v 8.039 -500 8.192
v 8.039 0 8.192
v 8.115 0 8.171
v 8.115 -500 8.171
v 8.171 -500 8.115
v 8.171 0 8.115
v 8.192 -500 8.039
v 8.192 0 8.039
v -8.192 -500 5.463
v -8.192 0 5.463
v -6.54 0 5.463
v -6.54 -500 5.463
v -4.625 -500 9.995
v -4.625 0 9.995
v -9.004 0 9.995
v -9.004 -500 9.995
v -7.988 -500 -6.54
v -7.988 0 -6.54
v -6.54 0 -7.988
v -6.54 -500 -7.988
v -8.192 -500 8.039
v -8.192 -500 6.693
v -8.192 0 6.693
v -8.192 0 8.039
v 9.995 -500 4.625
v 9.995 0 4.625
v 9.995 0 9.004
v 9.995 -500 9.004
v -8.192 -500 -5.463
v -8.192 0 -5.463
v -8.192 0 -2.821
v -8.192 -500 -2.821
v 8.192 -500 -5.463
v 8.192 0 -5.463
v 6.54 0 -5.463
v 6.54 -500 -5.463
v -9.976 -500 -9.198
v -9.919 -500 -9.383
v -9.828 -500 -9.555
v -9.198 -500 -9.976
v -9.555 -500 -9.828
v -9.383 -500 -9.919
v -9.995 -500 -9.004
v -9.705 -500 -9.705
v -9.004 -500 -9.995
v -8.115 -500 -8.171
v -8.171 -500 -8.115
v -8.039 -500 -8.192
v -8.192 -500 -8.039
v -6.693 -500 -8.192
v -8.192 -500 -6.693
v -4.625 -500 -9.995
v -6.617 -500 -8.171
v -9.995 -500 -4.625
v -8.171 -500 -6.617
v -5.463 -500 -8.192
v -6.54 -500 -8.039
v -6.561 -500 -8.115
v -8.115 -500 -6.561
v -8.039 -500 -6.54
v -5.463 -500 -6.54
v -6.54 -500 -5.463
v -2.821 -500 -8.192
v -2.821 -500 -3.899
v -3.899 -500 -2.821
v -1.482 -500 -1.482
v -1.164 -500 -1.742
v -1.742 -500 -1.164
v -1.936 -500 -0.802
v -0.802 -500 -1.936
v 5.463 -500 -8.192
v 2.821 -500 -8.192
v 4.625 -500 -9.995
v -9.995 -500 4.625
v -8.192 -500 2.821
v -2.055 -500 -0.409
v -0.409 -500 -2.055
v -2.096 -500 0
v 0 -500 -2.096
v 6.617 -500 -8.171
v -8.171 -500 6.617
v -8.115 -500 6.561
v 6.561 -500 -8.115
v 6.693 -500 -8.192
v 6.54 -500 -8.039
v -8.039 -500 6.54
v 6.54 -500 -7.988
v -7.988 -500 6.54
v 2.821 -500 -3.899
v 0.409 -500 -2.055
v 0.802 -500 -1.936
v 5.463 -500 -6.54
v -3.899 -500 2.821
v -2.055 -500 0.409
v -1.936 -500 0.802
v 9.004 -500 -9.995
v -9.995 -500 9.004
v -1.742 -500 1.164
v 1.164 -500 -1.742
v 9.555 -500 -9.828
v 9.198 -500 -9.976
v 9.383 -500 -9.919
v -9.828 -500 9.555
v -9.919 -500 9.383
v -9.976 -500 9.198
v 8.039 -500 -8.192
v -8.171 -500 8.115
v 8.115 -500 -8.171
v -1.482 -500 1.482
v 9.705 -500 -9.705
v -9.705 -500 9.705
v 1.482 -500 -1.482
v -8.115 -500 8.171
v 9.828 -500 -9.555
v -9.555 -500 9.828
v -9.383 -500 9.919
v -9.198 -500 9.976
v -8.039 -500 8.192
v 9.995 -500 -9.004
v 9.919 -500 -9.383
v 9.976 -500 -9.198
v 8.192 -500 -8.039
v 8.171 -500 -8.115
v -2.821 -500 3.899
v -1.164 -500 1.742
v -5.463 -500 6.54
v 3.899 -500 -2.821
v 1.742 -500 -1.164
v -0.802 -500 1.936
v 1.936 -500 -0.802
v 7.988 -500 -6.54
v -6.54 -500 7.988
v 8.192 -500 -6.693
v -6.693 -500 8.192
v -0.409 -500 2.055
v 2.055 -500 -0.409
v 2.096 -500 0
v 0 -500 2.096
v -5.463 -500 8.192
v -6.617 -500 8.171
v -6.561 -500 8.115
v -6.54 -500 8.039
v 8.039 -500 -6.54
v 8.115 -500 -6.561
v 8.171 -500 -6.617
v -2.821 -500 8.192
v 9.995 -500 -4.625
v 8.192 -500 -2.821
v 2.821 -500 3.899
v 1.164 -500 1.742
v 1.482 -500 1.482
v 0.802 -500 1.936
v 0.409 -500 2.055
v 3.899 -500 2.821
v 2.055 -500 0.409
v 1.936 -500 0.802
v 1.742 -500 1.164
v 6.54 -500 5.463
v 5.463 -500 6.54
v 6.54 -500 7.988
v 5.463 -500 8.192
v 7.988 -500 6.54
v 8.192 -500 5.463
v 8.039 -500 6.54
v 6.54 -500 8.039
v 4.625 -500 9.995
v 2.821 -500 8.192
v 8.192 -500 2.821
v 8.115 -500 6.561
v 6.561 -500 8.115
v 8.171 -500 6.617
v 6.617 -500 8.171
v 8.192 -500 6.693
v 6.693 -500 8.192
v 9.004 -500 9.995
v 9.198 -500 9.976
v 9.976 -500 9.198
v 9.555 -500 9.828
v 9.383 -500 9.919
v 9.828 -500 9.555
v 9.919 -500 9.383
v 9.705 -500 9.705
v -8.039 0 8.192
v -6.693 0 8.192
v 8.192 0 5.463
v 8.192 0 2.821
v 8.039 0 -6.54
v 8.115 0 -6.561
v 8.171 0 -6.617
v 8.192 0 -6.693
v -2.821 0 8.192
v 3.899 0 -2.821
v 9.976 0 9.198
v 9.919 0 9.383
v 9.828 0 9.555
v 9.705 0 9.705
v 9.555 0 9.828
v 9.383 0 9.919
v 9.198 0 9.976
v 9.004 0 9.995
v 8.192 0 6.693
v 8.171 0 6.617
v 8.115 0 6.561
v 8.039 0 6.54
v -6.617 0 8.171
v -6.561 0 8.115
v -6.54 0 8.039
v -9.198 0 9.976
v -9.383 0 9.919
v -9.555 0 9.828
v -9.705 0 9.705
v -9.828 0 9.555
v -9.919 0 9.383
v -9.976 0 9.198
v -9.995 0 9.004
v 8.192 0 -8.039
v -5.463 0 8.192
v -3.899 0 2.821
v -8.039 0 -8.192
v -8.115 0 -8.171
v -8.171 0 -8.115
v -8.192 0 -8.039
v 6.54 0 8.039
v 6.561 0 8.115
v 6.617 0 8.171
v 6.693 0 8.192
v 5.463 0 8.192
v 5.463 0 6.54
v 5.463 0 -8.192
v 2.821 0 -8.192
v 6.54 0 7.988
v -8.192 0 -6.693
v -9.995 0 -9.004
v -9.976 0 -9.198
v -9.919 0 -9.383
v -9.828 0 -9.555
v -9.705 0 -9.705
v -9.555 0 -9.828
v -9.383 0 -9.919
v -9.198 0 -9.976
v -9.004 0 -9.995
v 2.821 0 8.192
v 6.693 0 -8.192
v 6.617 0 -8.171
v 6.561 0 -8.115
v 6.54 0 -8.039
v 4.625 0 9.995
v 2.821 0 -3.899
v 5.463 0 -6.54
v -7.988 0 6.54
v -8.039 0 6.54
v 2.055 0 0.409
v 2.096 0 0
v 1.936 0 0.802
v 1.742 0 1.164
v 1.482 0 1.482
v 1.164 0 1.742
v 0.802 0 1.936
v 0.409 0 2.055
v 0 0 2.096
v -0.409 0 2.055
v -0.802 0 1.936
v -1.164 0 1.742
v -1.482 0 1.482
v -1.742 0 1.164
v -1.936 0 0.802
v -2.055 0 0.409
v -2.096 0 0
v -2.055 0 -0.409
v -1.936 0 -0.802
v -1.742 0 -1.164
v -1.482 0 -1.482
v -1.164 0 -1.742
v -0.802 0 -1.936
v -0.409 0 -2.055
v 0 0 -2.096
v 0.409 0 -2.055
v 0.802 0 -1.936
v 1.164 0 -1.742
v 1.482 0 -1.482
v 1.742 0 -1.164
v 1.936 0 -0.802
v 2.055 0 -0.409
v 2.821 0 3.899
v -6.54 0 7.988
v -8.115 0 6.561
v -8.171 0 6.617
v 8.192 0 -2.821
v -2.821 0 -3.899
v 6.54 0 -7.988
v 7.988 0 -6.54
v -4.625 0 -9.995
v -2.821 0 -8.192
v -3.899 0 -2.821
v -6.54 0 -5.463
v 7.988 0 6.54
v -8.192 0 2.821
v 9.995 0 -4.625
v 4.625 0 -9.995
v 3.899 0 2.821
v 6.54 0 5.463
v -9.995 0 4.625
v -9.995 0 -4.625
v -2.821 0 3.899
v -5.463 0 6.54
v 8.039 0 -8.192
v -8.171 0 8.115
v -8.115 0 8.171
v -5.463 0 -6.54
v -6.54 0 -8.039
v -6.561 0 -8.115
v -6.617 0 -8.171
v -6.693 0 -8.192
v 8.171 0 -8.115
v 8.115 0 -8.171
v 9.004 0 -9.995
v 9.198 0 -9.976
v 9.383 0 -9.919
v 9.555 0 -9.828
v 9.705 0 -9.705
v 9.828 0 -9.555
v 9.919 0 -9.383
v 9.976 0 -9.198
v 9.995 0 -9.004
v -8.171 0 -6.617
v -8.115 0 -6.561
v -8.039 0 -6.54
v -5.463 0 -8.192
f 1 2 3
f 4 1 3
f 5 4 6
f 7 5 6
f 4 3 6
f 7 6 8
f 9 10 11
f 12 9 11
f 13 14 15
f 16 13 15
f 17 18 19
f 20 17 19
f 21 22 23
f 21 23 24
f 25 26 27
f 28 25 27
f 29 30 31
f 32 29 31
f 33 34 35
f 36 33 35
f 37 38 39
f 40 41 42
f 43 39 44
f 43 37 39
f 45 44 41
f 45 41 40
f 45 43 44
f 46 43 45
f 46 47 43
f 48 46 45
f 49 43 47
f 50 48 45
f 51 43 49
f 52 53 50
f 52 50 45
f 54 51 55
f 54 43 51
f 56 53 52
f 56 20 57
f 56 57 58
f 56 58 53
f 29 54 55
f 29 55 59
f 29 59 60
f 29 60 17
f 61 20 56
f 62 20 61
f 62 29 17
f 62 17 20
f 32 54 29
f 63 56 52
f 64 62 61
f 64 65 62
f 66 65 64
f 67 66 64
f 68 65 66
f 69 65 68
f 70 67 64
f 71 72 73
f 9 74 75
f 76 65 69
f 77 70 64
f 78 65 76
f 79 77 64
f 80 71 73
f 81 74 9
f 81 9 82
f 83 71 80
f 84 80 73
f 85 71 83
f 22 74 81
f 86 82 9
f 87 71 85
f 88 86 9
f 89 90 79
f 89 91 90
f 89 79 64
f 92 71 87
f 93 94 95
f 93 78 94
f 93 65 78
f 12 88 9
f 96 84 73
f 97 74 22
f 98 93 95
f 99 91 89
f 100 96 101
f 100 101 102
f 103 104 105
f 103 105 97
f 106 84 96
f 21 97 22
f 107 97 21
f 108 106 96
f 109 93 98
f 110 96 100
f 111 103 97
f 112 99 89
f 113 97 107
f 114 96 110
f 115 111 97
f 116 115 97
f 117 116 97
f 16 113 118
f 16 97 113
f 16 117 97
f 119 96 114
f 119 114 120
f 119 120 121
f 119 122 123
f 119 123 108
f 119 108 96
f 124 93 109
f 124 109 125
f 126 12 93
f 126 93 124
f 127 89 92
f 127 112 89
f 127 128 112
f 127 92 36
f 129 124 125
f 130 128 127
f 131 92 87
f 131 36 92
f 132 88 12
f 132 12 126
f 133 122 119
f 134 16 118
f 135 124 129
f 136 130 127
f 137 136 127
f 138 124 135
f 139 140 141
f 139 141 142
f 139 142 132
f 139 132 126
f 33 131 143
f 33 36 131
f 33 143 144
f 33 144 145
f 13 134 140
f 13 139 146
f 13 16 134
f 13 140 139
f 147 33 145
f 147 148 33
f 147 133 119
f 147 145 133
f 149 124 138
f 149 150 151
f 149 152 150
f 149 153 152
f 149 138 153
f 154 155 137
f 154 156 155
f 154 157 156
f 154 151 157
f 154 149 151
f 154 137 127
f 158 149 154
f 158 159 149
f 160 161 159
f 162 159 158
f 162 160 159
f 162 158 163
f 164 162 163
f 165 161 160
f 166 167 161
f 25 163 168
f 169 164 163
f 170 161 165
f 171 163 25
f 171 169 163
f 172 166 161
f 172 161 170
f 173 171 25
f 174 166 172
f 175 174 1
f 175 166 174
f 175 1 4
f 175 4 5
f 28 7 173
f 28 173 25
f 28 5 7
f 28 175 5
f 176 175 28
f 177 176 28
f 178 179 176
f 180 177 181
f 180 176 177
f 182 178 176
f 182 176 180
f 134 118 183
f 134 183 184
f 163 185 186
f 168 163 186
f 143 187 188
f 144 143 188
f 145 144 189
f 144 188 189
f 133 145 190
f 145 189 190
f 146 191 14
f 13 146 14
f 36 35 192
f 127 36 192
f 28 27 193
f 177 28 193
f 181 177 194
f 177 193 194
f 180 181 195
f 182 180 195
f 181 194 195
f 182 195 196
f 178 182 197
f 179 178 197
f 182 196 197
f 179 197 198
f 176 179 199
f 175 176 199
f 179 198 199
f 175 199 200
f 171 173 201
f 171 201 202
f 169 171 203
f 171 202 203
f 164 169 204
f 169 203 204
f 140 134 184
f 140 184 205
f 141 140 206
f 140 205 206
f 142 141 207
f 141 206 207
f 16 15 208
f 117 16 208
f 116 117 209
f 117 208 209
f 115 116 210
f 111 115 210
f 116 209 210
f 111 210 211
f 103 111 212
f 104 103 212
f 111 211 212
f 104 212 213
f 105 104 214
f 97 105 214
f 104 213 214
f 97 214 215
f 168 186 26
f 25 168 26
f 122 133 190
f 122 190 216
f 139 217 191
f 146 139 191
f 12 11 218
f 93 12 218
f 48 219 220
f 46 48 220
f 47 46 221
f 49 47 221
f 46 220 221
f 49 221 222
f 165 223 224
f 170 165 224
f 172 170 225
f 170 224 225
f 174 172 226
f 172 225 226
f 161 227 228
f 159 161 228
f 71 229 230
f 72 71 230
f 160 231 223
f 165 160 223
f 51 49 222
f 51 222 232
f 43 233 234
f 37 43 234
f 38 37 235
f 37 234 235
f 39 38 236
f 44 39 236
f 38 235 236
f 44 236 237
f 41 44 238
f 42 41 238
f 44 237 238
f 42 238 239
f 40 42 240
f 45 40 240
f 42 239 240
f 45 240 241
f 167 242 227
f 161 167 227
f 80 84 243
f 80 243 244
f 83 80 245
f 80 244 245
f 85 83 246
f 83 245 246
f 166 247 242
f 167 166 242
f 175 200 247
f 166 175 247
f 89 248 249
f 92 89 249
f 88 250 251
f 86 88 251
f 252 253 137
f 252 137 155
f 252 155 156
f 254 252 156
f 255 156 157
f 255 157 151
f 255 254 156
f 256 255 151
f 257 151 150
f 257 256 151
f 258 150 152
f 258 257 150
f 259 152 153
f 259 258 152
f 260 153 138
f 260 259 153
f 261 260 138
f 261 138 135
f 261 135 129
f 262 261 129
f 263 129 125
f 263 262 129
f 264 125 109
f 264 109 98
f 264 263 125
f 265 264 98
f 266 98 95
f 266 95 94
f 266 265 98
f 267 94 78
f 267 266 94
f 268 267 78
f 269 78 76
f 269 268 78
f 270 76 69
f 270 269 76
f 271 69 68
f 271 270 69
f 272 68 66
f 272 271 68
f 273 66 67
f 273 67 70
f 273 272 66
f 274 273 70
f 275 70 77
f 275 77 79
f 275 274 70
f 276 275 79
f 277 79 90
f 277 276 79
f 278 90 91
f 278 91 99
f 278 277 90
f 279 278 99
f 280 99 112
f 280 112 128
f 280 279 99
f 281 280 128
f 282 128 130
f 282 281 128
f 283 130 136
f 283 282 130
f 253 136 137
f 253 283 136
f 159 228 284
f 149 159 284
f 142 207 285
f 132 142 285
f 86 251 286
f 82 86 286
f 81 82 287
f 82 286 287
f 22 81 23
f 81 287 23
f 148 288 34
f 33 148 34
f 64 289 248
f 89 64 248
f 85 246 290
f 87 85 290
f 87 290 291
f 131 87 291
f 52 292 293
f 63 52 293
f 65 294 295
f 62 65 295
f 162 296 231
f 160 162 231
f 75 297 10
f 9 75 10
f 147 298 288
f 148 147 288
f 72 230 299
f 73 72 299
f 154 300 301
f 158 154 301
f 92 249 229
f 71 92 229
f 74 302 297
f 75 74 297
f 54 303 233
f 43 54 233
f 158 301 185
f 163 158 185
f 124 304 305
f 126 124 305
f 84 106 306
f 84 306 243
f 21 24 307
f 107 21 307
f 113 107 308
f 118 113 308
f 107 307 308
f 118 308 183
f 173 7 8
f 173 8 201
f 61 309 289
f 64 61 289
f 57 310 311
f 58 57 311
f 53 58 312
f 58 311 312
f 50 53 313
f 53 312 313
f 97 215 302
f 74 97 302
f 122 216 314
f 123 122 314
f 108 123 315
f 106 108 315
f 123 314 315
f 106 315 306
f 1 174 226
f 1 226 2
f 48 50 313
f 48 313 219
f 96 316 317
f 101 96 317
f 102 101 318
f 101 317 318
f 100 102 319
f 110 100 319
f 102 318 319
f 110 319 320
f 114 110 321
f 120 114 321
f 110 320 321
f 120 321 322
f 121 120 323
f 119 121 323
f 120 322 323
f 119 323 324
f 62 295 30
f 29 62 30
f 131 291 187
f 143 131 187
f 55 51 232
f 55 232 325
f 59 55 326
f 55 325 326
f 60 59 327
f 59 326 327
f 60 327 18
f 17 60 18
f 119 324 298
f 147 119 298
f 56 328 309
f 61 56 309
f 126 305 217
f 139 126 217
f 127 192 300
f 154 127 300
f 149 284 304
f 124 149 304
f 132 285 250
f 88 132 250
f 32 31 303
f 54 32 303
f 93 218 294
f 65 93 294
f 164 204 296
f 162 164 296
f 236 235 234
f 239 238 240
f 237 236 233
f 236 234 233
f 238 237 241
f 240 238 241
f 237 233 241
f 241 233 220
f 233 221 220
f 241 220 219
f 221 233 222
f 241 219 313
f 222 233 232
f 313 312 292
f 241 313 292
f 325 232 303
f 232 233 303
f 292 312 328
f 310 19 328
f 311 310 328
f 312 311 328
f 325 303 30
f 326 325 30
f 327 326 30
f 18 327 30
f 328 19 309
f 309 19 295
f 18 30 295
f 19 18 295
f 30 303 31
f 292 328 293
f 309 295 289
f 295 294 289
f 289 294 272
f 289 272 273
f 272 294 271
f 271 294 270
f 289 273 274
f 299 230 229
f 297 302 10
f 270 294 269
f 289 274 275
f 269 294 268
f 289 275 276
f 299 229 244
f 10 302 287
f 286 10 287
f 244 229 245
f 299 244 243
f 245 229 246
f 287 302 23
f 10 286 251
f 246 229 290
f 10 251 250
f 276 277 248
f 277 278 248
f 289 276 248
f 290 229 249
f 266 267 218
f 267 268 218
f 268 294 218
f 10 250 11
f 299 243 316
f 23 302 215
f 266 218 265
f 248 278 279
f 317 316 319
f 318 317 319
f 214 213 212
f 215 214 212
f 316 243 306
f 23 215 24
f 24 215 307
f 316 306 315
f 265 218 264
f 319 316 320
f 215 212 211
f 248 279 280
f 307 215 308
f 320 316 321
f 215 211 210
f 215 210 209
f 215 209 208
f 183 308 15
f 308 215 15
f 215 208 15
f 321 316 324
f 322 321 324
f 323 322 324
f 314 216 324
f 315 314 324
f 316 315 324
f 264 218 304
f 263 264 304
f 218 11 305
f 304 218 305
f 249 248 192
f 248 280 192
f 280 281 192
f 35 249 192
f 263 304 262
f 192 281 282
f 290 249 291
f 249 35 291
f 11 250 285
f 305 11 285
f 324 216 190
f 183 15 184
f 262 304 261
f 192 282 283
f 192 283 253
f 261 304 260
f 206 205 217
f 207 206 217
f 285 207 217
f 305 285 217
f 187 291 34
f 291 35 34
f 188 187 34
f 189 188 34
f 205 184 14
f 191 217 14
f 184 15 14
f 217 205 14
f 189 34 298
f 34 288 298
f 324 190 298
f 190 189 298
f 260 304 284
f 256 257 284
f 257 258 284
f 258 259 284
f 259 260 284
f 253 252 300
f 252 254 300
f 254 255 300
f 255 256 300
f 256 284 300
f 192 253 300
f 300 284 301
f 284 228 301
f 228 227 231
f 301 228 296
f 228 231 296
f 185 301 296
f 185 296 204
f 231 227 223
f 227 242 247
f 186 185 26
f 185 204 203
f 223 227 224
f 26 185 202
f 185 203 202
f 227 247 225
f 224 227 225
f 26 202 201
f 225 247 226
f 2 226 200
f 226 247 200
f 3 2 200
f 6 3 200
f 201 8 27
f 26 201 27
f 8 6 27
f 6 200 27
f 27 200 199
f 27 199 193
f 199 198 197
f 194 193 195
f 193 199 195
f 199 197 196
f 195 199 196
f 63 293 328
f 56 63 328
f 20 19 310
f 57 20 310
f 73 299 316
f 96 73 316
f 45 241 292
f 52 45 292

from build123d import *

# Parameters (mm, degrees)
F0_R     = 2.0955
F2_DEPTH = 500


with BuildPart() as f2:
    # F0 (on Front) → F2 (new body)
    with BuildSketch(Plane.XZ):
        with BuildLine():
            Line((-4.6246692655, 9.9949), (-9.0043, 9.9949))
            ThreePointArc((-9.0043, 9.9949), (-9.7047599774, 9.7047599774), (-9.9949, 9.0043))
            Line((-9.9949, 9.0043), (-9.9949, 4.6246692655))
            Line((-9.9949, 4.6246692655), (-8.1915, 2.8212692655))
            Line((-8.1915, 2.8212692655), (-8.1915, 5.4628692655))
            Line((-8.1915, 5.4628692655), (-6.5405, 5.4628692655))
            Line((-6.5405, 5.4628692655), (-3.8989, 2.8212692655))
            Line((-3.8989, 2.8212692655), (-3.8989, -2.8212692655))
            Line((-3.8989, -2.8212692655), (-6.5405, -5.4628692655))
            Line((-6.5405, -5.4628692655), (-8.1915, -5.4628692655))
            Line((-8.1915, -5.4628692655), (-8.1915, -2.8212692655))
            Line((-8.1915, -2.8212692655), (-9.9949, -4.6246692655))
            Line((-9.9949, -4.6246692655), (-9.9949, -9.0043))
            ThreePointArc((-9.9949, -9.0043), (-9.7047599774, -9.7047599774), (-9.0043, -9.9949))
            Line((-9.0043, -9.9949), (-4.6246692655, -9.9949))
            Line((-4.6246692655, -9.9949), (-2.8212692655, -8.1915))
            Line((-2.8212692655, -8.1915), (-5.4628692655, -8.1915))
            Line((-5.4628692655, -8.1915), (-5.4628692655, -6.5405))
            Line((-5.4628692655, -6.5405), (-2.8212692655, -3.8989))
            Line((-2.8212692655, -3.8989), (2.8212692655, -3.8989))
            Line((2.8212692655, -3.8989), (5.4628692655, -6.5405))
            Line((5.4628692655, -6.5405), (5.4628692655, -8.1915))
            Line((5.4628692655, -8.1915), (2.8212692655, -8.1915))
            Line((2.8212692655, -8.1915), (4.6246692655, -9.9949))
            Line((4.6246692655, -9.9949), (9.0043, -9.9949))
            ThreePointArc((9.0043, -9.9949), (9.7047599774, -9.7047599774), (9.9949, -9.0043))
            Line((9.9949, -9.0043), (9.9949, -4.6246692655))
            Line((9.9949, -4.6246692655), (8.1915, -2.8212692655))
            Line((8.1915, -2.8212692655), (8.1915, -5.4628692655))
            Line((8.1915, -5.4628692655), (6.5405, -5.4628692655))
            Line((6.5405, -5.4628692655), (3.8989, -2.8212692655))
            Line((3.8989, -2.8212692655), (3.8989, 2.8212692655))
            Line((3.8989, 2.8212692655), (6.5405, 5.4628692655))
            Line((6.5405, 5.4628692655), (8.1915, 5.4628692655))
            Line((8.1915, 5.4628692655), (8.1915, 2.8212692655))
            Line((8.1915, 2.8212692655), (9.9949, 4.6246692655))
            Line((9.9949, 4.6246692655), (9.9949, 9.0043))
            ThreePointArc((9.9949, 9.0043), (9.7047599774, 9.7047599774), (9.0043, 9.9949))
            Line((9.0043, 9.9949), (4.6246692655, 9.9949))
            Line((4.6246692655, 9.9949), (2.8212692655, 8.1915))
            Line((2.8212692655, 8.1915), (5.4628692655, 8.1915))
            Line((5.4628692655, 8.1915), (5.4628692655, 6.5405))
            Line((5.4628692655, 6.5405), (2.8212692655, 3.8989))
            Line((2.8212692655, 3.8989), (-2.8212692655, 3.8989))
            Line((-2.8212692655, 3.8989), (-5.4628692655, 6.5405))
            Line((-5.4628692655, 6.5405), (-5.4628692655, 8.1915))
            Line((-5.4628692655, 8.1915), (-2.8212692655, 8.1915))
            Line((-2.8212692655, 8.1915), (-4.6246692655, 9.9949))
        make_face()
        with BuildLine():
            ThreePointArc((-8.0391, -8.1915), (-8.1468630735, -8.1468630735), (-8.1915, -8.0391))
            Line((-8.1915, -8.0391), (-8.1915, -6.6929))
            ThreePointArc((-8.1915, -6.6929), (-8.1468630735, -6.5851369265), (-8.0391, -6.5405))
            Line((-8.0391, -6.5405), (-7.9883, -6.5405))
            Line((-7.9883, -6.5405), (-6.5405, -7.9883))
            Line((-6.5405, -7.9883), (-6.5405, -8.0391))
            ThreePointArc((-6.5405, -8.0391), (-6.5851369265, -8.1468630735), (-6.6929, -8.1915))
            Line((-6.6929, -8.1915), (-8.0391, -8.1915))
        make_face(mode=Mode.SUBTRACT)
        with BuildLine():
            Line((8.1915, -6.6929), (8.1915, -8.0391))
            ThreePointArc((8.1915, -8.0391), (8.1468630735, -8.1468630735), (8.0391, -8.1915))
            Line((8.0391, -8.1915), (6.6929, -8.1915))
            ThreePointArc((6.6929, -8.1915), (6.5851369265, -8.1468630735), (6.5405, -8.0391))
            Line((6.5405, -8.0391), (6.5405, -7.9883))
            Line((6.5405, -7.9883), (7.9883, -6.5405))
            Line((7.9883, -6.5405), (8.0391, -6.5405))
            ThreePointArc((8.0391, -6.5405), (8.1468630735, -6.5851369265), (8.1915, -6.6929))
        make_face(mode=Mode.SUBTRACT)
        with BuildLine():
            Line((-7.9883, 6.5405), (-8.0391, 6.5405))
            ThreePointArc((-8.0391, 6.5405), (-8.1468630735, 6.5851369265), (-8.1915, 6.6929))
            Line((-8.1915, 6.6929), (-8.1915, 8.0391))
            ThreePointArc((-8.1915, 8.0391), (-8.1468630735, 8.1468630735), (-8.0391, 8.1915))
            Line((-8.0391, 8.1915), (-6.6929, 8.1915))
            ThreePointArc((-6.6929, 8.1915), (-6.5851369265, 8.1468630735), (-6.5405, 8.0391))
            Line((-6.5405, 8.0391), (-6.5405, 7.9883))
            Line((-6.5405, 7.9883), (-7.9883, 6.5405))
        make_face(mode=Mode.SUBTRACT)
        Circle(F0_R, mode=Mode.SUBTRACT)
        with BuildLine():
            ThreePointArc((8.1915, 6.6929), (8.1468630735, 6.5851369265), (8.0391, 6.5405))
            Line((8.0391, 6.5405), (7.9883, 6.5405))
            Line((7.9883, 6.5405), (6.5405, 7.9883))
            Line((6.5405, 7.9883), (6.5405, 8.0391))
            ThreePointArc((6.5405, 8.0391), (6.5851369265, 8.1468630735), (6.6929, 8.1915))
            Line((6.6929, 8.1915), (8.0391, 8.1915))
            ThreePointArc((8.0391, 8.1915), (8.1468630735, 8.1468630735), (8.1915, 8.0391))
            Line((8.1915, 8.0391), (8.1915, 6.6929))
        make_face(mode=Mode.SUBTRACT)
    extrude(amount=F2_DEPTH)


solid = f2.part
